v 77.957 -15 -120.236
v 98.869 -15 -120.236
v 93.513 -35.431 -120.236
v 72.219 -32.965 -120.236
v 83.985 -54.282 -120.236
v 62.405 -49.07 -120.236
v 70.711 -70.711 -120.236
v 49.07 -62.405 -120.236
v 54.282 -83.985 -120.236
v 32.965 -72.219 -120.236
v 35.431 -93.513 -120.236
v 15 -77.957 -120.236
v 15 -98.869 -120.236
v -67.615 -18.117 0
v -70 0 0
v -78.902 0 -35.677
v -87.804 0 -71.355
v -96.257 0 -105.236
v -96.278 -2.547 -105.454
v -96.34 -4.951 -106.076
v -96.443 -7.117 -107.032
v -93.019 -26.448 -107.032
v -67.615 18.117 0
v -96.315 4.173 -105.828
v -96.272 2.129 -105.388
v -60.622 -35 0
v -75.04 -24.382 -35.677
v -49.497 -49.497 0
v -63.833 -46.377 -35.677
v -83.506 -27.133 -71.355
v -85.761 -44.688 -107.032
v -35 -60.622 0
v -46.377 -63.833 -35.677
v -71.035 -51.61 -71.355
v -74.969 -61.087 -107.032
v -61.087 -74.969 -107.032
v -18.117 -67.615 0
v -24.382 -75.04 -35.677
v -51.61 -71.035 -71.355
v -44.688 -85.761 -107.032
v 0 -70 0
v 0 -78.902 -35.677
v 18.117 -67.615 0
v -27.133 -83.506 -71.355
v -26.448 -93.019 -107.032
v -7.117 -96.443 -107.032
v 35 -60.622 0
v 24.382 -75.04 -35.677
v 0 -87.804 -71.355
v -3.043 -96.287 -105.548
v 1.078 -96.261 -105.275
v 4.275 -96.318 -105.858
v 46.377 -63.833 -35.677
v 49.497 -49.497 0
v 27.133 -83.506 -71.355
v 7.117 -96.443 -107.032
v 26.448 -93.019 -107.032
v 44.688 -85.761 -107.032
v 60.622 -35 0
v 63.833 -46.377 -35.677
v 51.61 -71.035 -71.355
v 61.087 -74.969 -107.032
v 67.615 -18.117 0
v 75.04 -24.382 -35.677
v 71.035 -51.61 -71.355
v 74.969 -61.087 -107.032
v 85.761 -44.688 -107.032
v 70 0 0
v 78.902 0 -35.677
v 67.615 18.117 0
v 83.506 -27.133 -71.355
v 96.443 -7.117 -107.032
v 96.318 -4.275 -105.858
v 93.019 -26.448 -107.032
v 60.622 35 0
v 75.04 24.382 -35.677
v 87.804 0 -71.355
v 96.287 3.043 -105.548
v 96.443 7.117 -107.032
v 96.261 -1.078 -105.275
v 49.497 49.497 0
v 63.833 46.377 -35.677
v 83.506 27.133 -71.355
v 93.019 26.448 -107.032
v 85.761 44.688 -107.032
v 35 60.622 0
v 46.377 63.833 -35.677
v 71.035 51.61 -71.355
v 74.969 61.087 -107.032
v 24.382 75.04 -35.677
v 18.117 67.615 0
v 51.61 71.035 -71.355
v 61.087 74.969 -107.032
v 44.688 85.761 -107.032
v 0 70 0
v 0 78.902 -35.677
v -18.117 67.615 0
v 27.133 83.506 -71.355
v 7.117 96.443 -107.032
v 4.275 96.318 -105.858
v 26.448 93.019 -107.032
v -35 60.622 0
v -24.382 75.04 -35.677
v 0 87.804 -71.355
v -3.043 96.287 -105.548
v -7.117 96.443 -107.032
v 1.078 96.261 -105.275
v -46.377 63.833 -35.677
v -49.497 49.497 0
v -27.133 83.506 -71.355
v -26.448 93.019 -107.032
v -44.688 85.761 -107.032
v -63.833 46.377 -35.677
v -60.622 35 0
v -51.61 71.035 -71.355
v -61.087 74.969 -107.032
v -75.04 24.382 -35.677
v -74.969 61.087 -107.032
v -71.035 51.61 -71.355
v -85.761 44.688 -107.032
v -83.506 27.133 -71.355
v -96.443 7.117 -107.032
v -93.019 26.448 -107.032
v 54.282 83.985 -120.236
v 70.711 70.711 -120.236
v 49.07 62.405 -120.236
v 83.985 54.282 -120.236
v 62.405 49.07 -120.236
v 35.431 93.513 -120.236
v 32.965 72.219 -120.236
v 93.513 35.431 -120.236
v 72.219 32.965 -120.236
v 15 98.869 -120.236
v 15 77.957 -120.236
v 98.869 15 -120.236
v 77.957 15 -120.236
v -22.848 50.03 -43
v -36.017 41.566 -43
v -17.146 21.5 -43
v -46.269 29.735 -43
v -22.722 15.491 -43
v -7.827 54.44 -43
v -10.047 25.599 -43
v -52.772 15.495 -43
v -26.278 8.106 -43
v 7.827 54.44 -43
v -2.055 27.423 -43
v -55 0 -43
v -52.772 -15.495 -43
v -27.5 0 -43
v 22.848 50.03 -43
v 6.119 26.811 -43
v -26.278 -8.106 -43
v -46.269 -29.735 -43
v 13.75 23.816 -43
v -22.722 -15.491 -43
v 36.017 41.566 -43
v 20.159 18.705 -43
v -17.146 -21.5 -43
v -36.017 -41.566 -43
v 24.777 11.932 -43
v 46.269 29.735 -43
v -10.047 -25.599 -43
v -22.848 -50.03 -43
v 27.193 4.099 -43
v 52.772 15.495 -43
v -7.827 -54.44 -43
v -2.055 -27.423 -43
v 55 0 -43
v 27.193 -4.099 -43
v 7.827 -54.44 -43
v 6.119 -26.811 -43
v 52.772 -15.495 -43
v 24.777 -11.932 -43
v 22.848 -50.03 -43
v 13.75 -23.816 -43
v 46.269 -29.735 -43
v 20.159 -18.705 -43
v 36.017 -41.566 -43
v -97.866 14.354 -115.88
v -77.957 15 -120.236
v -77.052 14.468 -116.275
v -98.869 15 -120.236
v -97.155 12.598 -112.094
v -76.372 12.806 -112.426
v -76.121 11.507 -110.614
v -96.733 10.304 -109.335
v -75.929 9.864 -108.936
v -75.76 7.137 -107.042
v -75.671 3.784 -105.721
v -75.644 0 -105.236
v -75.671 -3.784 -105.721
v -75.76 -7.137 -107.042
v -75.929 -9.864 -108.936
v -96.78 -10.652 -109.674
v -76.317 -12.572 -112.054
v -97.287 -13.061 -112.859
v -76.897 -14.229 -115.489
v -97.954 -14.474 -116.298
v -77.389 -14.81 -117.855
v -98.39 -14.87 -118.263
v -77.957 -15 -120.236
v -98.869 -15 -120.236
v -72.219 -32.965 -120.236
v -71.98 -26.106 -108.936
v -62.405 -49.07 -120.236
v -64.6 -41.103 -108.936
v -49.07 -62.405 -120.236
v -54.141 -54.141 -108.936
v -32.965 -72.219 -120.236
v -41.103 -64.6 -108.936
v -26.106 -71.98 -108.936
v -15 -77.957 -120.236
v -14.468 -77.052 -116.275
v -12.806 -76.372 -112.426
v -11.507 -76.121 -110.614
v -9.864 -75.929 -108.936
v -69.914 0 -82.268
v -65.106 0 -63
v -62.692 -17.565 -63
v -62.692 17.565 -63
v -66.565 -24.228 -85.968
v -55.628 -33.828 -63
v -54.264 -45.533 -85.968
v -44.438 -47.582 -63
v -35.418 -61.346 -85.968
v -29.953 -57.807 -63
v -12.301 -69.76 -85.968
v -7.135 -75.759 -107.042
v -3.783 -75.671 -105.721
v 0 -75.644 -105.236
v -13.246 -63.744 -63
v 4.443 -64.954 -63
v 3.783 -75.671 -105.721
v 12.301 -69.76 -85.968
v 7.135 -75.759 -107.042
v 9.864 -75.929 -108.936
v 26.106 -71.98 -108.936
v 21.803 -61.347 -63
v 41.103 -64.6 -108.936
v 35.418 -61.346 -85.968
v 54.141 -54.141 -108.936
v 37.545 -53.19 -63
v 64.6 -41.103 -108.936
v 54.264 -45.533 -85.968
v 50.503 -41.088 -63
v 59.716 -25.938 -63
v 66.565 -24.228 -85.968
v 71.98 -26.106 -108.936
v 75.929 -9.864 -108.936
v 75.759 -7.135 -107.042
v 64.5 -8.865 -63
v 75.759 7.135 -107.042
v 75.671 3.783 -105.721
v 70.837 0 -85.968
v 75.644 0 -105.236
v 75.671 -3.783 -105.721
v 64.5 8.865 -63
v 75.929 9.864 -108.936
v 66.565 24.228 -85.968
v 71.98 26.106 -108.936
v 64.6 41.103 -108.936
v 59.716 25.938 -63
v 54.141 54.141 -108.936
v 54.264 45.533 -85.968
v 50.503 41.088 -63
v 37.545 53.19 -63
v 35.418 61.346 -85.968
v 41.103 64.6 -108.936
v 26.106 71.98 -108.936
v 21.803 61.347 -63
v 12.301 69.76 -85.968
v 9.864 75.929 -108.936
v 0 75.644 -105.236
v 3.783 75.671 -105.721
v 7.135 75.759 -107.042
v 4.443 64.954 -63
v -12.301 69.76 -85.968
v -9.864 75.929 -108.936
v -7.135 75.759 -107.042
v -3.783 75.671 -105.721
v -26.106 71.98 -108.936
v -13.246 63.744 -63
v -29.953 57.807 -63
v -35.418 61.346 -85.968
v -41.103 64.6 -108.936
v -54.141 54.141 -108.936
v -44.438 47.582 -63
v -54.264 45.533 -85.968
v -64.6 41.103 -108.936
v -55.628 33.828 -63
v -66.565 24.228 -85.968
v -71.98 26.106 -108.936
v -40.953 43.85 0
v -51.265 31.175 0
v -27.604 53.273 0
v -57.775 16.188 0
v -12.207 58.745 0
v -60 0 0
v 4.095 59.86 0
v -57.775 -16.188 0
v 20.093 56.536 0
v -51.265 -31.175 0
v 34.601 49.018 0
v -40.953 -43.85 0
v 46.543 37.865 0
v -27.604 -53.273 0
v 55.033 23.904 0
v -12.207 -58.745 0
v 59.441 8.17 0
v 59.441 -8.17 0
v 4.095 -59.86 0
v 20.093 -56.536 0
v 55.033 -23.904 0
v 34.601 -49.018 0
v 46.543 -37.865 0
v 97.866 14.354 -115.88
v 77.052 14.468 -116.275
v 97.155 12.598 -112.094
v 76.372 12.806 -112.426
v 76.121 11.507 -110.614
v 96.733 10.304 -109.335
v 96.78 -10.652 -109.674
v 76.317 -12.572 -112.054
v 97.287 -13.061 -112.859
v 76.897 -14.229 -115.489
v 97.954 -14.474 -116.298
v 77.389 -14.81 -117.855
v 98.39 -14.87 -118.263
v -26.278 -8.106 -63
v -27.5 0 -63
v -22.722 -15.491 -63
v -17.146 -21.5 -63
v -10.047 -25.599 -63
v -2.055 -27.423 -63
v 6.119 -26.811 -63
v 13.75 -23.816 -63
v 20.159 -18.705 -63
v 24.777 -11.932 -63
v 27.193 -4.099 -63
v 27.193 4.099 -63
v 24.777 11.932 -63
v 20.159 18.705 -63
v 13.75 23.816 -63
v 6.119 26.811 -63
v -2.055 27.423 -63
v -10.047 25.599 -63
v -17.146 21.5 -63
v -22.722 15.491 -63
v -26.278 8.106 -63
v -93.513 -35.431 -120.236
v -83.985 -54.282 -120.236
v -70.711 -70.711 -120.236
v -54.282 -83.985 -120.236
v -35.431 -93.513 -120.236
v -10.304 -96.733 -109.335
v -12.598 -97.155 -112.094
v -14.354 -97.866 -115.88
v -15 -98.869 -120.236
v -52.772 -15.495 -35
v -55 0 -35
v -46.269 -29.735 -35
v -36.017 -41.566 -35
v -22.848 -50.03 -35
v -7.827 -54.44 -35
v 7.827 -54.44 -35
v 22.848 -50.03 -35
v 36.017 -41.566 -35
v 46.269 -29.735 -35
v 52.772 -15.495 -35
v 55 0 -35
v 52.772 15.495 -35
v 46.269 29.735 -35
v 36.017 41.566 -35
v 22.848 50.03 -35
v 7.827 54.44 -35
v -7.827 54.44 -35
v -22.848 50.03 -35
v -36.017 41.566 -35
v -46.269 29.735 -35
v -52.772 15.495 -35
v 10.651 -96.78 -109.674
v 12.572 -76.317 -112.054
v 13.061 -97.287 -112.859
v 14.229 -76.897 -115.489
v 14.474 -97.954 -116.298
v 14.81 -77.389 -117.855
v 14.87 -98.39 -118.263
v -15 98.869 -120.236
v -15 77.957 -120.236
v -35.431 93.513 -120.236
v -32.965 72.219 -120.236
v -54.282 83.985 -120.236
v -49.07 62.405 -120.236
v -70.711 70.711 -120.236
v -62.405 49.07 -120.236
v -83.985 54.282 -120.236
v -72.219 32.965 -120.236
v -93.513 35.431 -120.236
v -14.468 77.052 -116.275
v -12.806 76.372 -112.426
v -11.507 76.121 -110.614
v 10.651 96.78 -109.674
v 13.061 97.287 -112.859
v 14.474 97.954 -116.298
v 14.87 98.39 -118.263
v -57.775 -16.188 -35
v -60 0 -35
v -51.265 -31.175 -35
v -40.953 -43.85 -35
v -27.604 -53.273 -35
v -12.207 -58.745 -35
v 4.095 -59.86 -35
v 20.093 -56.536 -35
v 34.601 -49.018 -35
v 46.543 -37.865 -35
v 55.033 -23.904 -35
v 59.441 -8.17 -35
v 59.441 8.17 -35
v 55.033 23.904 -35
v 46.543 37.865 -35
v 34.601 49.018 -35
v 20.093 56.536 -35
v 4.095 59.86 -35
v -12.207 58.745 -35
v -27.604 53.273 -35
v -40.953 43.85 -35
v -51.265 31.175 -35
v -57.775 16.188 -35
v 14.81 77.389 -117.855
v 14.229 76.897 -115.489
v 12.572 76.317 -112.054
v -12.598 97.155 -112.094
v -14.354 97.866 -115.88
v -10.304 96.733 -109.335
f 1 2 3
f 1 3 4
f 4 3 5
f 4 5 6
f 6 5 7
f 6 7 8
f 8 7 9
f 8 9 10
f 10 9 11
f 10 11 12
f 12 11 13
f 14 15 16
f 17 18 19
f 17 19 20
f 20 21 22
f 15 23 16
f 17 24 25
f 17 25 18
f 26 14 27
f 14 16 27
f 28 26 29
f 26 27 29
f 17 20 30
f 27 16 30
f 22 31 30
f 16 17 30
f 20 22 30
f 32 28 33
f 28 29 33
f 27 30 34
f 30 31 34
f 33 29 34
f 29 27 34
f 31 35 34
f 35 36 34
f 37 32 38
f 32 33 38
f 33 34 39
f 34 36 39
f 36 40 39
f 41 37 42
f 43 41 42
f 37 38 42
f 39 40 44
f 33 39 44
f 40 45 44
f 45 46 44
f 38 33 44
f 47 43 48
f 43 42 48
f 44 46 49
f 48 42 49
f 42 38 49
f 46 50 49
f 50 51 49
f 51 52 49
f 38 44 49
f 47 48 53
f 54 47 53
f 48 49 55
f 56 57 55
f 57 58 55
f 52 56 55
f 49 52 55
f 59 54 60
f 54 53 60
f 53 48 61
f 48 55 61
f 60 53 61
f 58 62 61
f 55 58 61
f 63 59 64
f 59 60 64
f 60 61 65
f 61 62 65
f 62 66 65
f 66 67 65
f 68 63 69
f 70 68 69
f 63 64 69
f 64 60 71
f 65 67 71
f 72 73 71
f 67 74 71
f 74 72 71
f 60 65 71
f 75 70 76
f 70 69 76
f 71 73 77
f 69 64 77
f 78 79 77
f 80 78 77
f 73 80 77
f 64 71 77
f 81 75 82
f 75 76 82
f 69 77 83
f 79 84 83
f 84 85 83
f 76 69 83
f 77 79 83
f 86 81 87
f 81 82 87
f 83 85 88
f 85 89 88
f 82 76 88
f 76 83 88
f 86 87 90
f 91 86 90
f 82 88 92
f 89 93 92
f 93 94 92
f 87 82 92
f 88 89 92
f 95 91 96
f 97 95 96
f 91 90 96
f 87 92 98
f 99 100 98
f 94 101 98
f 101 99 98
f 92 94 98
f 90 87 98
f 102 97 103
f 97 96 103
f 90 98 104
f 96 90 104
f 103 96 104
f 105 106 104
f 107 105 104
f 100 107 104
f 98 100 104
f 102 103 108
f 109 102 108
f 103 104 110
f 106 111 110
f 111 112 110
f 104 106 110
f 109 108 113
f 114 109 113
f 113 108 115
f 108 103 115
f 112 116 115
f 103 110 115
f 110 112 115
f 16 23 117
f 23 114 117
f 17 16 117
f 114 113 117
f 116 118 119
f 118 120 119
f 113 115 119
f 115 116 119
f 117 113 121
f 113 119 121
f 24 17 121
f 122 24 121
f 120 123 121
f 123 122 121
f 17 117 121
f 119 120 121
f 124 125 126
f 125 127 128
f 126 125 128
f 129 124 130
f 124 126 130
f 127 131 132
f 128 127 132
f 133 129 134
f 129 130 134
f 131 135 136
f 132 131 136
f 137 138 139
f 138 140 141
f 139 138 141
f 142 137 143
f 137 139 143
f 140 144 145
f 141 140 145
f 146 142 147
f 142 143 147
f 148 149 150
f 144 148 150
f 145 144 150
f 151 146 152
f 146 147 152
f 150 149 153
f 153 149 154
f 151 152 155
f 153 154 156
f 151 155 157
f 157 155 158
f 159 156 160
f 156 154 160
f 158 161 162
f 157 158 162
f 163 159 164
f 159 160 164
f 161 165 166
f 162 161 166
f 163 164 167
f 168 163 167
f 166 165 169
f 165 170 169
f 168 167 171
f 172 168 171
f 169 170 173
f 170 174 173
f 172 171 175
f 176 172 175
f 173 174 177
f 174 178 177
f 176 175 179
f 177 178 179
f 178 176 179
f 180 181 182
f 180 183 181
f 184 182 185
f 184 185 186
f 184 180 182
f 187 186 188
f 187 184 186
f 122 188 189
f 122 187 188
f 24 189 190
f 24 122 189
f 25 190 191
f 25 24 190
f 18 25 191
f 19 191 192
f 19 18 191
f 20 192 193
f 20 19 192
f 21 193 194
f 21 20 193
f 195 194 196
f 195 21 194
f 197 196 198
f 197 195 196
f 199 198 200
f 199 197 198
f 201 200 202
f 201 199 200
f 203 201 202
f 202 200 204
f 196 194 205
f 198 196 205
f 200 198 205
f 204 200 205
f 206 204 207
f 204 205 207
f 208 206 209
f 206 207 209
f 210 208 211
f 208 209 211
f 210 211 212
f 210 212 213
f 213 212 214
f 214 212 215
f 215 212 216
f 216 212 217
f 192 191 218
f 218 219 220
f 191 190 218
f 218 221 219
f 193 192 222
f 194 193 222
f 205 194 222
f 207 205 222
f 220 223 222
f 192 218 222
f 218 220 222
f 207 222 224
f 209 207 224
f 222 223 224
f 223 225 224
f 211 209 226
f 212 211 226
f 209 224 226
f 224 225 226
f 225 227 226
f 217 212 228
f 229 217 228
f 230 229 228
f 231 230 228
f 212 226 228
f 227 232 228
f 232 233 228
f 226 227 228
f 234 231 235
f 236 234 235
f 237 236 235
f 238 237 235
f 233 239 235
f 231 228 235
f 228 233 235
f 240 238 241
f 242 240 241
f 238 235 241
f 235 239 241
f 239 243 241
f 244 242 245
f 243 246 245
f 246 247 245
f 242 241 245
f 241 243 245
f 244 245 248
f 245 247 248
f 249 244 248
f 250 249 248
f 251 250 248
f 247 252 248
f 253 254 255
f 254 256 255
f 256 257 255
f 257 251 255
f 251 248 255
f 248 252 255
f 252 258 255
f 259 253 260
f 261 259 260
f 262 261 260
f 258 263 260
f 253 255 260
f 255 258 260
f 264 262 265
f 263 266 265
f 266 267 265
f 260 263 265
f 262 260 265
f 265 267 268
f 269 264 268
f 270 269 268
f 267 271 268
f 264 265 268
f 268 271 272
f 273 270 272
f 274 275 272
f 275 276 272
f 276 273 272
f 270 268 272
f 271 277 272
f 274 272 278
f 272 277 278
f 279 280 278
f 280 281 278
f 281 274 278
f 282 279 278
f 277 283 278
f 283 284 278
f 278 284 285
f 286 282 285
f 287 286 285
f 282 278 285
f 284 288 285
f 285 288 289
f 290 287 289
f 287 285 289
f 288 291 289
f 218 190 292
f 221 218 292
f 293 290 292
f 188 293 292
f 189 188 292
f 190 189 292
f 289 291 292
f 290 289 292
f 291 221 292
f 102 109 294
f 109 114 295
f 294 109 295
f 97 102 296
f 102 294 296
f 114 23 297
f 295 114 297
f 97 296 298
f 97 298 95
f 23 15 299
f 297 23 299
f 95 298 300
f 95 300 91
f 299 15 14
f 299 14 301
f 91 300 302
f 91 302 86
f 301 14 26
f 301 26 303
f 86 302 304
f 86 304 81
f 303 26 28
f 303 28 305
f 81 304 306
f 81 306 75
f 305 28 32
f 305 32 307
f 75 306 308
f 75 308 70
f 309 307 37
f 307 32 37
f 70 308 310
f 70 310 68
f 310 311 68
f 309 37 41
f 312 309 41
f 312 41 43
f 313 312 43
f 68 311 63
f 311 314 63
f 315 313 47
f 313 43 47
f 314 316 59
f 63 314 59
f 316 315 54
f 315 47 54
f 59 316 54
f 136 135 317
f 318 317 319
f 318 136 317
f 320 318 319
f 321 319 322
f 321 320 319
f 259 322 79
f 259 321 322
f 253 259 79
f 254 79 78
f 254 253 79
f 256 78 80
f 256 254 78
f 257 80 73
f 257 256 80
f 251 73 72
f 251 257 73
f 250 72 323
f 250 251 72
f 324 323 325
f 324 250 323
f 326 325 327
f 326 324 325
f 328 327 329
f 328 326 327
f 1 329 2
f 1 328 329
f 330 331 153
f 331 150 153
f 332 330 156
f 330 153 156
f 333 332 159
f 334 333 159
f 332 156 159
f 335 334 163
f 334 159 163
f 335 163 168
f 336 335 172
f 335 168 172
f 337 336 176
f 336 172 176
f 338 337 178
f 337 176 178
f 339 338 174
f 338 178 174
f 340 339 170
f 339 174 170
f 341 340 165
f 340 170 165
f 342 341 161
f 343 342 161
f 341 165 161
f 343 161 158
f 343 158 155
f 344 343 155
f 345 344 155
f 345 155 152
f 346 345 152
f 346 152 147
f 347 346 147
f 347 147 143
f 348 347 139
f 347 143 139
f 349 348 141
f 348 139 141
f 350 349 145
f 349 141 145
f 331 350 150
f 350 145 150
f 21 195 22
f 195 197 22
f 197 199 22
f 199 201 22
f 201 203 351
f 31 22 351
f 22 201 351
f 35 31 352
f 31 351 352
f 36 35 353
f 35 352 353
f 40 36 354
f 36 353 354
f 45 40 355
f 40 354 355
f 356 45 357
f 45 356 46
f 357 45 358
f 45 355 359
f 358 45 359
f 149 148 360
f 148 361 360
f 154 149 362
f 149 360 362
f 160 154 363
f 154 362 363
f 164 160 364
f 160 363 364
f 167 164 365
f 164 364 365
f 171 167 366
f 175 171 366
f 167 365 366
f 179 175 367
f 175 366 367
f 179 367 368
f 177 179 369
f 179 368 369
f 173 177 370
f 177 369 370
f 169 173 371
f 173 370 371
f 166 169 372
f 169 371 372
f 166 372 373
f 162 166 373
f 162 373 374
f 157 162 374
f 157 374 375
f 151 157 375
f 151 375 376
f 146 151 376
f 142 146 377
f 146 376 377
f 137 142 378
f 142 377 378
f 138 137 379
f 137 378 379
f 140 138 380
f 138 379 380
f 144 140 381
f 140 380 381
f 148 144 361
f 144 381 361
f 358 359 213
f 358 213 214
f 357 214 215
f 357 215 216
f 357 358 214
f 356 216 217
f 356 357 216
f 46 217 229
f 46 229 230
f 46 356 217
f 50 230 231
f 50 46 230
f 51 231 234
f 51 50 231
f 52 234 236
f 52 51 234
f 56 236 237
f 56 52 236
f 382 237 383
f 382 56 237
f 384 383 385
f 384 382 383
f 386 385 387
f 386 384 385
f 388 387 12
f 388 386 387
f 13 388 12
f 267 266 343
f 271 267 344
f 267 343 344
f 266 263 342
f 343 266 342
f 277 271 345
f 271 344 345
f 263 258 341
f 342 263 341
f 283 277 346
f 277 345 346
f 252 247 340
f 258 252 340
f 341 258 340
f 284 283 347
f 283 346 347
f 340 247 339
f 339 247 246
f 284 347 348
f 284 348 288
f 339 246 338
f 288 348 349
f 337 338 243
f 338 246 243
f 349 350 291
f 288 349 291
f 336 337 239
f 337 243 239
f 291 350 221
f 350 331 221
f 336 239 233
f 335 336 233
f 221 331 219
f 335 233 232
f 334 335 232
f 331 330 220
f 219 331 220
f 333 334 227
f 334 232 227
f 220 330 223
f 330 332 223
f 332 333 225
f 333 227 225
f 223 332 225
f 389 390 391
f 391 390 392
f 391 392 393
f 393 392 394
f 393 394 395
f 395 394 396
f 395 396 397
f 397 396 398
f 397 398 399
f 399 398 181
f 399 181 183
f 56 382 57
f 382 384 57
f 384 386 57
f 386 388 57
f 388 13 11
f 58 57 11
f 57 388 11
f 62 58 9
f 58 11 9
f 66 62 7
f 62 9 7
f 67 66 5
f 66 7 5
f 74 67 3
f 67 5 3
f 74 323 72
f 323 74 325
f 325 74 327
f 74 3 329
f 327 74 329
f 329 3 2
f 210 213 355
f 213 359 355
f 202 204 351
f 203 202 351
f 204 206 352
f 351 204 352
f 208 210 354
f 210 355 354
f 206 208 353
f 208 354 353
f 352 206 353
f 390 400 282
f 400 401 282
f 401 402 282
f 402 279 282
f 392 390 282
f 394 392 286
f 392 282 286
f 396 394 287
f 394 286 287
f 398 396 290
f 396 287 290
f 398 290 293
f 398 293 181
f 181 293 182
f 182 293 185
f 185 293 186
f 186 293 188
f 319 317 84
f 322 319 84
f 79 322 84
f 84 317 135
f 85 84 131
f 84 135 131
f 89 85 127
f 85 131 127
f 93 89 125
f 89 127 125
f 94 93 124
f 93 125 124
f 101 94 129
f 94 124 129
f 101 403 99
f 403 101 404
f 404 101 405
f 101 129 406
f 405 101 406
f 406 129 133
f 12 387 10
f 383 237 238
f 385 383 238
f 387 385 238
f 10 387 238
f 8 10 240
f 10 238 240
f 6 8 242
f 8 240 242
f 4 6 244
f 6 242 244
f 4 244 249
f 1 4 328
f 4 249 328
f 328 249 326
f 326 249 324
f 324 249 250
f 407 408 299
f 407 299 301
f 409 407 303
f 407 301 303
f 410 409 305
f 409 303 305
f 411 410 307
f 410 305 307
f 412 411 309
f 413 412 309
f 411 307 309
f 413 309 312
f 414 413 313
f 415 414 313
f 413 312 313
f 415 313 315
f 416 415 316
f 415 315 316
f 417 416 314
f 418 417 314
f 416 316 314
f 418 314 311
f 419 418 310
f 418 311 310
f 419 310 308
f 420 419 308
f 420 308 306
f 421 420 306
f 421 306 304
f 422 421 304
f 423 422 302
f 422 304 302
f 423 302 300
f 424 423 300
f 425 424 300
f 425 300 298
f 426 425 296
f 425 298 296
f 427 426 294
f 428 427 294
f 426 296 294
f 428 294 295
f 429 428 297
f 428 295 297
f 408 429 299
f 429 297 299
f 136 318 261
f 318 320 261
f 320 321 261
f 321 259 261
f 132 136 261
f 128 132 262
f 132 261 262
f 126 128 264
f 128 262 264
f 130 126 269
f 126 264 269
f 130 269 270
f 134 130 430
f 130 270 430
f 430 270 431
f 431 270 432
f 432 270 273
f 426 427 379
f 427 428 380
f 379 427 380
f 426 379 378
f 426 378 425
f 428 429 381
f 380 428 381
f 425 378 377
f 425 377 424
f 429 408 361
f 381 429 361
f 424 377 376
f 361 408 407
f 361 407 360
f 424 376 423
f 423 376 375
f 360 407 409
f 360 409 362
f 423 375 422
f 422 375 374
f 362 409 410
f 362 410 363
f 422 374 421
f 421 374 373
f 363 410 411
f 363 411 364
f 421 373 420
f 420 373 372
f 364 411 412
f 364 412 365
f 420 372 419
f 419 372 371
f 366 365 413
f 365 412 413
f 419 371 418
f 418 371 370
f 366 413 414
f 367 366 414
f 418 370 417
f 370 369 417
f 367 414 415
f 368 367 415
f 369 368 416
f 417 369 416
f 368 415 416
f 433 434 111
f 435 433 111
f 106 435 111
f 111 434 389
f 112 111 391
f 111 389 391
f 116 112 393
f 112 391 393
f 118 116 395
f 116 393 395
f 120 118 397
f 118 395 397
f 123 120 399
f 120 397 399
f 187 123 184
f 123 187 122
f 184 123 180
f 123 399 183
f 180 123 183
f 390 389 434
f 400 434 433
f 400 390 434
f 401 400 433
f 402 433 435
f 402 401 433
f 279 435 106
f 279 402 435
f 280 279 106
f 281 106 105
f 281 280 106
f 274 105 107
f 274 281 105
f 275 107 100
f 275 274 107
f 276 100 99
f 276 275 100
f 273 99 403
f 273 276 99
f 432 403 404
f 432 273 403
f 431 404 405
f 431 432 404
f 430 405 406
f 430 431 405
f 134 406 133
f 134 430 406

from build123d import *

# Parameters (mm, degrees)
CUT_EXTRUDE3_DEPTH      = 186.625026901
CUT_EXTRUDE3_DEPTH_BACK = 186.625026901
SKETCH5_R               = 15
CUT_EXTRUDE4_DEPTH      = 186.017973926
CUT_EXTRUDE4_DEPTH_BACK = 186.017973926
SKETCH7_R               = 15


with BuildPart() as part:
    # Sketch2 → Revolve2 (revolve)
    with BuildSketch(Plane(origin=(0, 0, 0), x_dir=(1, 0, 0), z_dir=(0, 1, 0)), mode=Mode.PRIVATE) as revolve2_sk:
        Polygon((76.5673553, 108.935679163), (65.10595835, 63), (27.5, 63), (27.5, 43), (55, 43), (55, 35), (60, 35), (60, 0), (70, 0), (96.705505264, 107.031937471), (100, 120.235812519), (79.386848042, 120.235812519), align=None)
    revolve(revolve2_sk.sketch.rotate(Axis((0, 0, -120), (0, 0, 1)), 180), axis=Axis((0, 0, -120), (0, 0, 1)))

    # Sketch5 → Cut-Extrude3 (cut, two sides: drawn at the far end of the back side and taken through both)
    with BuildSketch(Plane(origin=(0, 0, 0), x_dir=(0, 0, -1), z_dir=(1, 0, 0)).offset(-CUT_EXTRUDE3_DEPTH_BACK)):
        with Locations((120.235812519, 0)):
            Circle(SKETCH5_R)
    extrude(amount=CUT_EXTRUDE3_DEPTH + CUT_EXTRUDE3_DEPTH_BACK, mode=Mode.SUBTRACT)

    # Sketch7 → Cut-Extrude4 (cut, two sides: drawn at the far end of the back side and taken through both)
    with BuildSketch(Plane(origin=(0, 0, 0), x_dir=(1, 0, 0), z_dir=(0, 1, 0)).offset(-CUT_EXTRUDE4_DEPTH_BACK)):
        with Locations((0, 120.235812519)):
            Circle(SKETCH7_R)
    extrude(amount=CUT_EXTRUDE4_DEPTH + CUT_EXTRUDE4_DEPTH_BACK, mode=Mode.SUBTRACT)


solid = part.part
